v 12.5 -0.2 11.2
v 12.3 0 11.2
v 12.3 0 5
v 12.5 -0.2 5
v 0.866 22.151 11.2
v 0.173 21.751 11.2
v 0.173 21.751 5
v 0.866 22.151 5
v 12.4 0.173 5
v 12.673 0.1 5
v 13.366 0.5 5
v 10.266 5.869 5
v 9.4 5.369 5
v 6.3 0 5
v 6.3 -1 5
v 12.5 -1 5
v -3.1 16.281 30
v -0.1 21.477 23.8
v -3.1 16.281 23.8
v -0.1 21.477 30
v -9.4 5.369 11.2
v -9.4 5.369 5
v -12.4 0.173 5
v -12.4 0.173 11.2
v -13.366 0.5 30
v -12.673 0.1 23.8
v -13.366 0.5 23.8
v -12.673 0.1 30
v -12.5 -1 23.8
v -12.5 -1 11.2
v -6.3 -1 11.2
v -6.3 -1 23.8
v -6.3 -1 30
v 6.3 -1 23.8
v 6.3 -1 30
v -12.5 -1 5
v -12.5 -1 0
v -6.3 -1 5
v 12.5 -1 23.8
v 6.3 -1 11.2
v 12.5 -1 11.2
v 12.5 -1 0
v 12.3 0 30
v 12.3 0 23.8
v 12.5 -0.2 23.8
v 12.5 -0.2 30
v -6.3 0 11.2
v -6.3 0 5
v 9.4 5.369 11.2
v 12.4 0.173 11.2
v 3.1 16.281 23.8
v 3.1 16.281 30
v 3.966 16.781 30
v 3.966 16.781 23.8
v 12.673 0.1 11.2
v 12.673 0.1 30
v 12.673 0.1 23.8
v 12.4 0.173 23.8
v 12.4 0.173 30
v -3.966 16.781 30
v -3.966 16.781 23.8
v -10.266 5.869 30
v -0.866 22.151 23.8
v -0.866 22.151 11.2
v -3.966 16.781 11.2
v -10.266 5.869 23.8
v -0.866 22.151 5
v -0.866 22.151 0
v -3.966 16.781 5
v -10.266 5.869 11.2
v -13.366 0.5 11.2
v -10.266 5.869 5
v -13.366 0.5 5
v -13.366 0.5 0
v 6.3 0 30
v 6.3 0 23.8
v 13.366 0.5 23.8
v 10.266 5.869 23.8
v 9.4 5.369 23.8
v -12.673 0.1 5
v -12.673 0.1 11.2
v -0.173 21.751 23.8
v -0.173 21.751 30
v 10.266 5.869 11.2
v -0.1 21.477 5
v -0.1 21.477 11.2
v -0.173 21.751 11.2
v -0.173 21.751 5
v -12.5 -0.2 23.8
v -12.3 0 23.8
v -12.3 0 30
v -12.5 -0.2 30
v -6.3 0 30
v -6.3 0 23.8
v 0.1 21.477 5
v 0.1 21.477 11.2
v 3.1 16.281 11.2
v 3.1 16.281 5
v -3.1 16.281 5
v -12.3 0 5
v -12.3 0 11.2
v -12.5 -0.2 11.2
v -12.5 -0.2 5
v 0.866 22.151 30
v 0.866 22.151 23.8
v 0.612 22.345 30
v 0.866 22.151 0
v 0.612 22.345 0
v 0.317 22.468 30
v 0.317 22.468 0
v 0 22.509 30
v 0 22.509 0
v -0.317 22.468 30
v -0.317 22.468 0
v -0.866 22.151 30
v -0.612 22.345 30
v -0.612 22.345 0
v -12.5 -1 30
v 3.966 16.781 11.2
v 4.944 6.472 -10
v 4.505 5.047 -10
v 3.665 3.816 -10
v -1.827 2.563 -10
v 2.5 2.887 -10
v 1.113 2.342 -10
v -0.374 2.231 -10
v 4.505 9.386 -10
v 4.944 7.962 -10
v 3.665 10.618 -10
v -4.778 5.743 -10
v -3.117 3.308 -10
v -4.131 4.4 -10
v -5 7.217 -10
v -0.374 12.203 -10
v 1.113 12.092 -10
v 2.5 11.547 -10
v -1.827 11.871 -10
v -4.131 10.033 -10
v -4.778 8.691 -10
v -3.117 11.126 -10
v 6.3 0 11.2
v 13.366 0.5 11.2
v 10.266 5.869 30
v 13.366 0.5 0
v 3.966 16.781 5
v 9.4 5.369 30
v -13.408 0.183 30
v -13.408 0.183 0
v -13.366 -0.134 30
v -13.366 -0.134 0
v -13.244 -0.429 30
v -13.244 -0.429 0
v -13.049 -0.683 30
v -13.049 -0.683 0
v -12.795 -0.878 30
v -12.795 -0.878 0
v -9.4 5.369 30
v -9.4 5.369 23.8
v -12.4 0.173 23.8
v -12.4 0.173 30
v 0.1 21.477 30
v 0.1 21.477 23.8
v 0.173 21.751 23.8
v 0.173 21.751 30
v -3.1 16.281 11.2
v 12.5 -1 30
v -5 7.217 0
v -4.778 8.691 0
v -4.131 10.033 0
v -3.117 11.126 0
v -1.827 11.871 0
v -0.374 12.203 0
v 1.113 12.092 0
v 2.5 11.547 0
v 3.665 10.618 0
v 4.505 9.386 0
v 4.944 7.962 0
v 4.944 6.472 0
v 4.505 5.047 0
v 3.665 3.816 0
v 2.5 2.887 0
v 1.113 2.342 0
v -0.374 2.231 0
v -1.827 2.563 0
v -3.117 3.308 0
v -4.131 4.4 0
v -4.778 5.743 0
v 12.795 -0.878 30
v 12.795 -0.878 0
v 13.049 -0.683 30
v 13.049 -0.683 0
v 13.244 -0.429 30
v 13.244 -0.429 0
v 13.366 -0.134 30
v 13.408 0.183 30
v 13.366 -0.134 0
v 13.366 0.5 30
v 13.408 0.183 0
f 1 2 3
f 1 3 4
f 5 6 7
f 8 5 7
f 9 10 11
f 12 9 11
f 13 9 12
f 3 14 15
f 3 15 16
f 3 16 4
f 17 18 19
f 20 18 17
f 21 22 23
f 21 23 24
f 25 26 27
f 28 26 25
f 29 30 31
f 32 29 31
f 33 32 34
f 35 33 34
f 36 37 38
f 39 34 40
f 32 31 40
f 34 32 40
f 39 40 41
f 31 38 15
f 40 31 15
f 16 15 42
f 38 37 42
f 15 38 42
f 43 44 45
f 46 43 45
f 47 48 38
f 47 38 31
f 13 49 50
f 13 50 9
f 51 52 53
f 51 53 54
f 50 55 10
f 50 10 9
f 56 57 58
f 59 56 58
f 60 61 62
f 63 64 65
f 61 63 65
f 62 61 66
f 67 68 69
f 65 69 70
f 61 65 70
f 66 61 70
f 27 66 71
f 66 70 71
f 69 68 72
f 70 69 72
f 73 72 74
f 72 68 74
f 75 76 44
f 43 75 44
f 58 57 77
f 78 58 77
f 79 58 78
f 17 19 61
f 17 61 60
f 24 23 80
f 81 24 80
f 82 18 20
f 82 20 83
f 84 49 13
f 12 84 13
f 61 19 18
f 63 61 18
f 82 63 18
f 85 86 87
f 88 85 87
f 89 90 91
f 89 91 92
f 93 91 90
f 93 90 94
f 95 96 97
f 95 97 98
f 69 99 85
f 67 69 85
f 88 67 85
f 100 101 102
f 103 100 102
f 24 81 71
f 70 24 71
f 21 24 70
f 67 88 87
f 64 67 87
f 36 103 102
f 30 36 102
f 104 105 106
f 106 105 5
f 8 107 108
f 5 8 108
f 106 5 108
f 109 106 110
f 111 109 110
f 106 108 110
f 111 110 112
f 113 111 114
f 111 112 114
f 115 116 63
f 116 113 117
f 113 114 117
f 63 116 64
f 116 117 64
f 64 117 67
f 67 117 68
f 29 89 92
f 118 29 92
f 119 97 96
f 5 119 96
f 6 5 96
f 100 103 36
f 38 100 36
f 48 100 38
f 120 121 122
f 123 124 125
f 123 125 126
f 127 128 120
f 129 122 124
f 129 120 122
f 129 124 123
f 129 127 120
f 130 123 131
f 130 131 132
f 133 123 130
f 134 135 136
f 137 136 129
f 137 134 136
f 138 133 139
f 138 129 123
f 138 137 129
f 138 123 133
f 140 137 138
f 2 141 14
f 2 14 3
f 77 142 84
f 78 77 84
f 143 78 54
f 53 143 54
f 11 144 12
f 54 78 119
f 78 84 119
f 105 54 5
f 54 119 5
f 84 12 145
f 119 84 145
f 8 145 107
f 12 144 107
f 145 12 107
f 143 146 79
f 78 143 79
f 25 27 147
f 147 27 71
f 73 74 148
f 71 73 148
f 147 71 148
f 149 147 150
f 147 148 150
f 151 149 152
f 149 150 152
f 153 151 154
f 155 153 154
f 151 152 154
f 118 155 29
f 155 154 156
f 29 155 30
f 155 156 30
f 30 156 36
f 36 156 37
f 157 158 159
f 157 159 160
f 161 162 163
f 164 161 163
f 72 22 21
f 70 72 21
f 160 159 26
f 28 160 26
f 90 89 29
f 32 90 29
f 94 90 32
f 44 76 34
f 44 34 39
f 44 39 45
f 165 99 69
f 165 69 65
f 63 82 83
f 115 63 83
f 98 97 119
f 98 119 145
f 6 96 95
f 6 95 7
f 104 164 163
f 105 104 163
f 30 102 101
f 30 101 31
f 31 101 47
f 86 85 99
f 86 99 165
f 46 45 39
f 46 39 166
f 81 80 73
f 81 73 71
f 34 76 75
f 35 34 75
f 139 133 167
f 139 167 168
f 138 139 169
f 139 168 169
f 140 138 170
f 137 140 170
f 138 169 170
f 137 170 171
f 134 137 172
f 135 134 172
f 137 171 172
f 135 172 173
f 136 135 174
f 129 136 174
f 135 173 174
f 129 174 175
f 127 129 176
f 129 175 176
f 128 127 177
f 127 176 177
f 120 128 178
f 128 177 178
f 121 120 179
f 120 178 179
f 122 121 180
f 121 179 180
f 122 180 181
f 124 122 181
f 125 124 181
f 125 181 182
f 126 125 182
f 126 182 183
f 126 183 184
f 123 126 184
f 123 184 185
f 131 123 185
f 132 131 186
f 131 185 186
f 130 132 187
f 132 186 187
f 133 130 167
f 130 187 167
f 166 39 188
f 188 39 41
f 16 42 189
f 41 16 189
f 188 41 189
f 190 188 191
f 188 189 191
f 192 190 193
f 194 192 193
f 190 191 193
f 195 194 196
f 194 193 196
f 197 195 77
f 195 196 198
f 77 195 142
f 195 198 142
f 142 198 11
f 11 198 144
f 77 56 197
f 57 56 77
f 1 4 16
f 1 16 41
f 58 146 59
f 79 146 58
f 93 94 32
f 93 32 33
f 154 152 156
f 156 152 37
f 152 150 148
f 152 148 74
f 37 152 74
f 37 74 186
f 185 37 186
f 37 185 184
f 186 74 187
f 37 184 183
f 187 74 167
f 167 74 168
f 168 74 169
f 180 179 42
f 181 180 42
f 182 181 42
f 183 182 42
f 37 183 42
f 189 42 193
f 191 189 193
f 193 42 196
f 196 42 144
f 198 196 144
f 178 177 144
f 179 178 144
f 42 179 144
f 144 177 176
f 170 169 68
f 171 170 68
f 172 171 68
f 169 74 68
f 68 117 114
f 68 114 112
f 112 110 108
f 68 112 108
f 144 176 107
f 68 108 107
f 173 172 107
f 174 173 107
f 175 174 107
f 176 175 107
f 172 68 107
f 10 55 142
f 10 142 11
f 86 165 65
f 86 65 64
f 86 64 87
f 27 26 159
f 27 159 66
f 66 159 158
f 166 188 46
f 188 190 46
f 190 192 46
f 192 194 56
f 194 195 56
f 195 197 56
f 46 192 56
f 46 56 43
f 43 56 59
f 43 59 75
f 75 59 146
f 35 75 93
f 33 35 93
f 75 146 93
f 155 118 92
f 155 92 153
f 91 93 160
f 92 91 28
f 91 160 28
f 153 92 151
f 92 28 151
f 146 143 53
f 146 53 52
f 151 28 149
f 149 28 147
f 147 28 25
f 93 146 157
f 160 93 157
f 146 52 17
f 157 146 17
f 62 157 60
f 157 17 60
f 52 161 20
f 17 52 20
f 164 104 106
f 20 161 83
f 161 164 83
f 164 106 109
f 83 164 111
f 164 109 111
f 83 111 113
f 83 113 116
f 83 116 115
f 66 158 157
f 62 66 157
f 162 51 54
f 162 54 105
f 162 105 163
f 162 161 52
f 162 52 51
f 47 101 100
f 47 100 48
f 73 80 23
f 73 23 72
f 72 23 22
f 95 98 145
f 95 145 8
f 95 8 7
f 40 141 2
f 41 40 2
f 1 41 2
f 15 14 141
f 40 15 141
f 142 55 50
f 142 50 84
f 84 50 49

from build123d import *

# Parameters (mm, degrees)
EXTRUDE_1_DEPTH       = 30
EXTRUDE_8_DEPTH       = 30
SKETCH_2_W            = 6.2
SKETCH_2_H            = 6.2
CUT_EXTRUDE_5_DEPTH   = 1
EXTRUDE_9_DEPTH       = 6.2
EXTRUDE_9_DEPTH_BACK  = 23.8
SKETCH_15_W           = 6.2
SKETCH_15_H           = 6.2
CUT_EXTRUDE_10_DEPTH  = 1
EXTRUDE_10_DEPTH      = 6.2
EXTRUDE_10_DEPTH_BACK = 23.8
EXTRUDE_11_DEPTH      = 6.2
EXTRUDE_11_DEPTH_BACK = 23.8
SKETCH_20_W           = 6.2
SKETCH_20_H           = 6.2
CUT_EXTRUDE_11_DEPTH  = 1
EXTRUDE_12_DEPTH      = 6.2
EXTRUDE_12_DEPTH_BACK = 23.8
EXTRUDE_13_DEPTH      = 6.2
EXTRUDE_13_DEPTH_BACK = 23.8
EXTRUDE_14_DEPTH      = 6.2
EXTRUDE_14_DEPTH_BACK = 23.8
SKETCH_25_R           = 5
EXTRUDE_15_DEPTH      = 10


with BuildPart() as part:
    # ｽｹｯﾁ1 → ﾎﾞｽ - 押し出し1 (new body)
    with BuildSketch(Plane.XY):
        Polygon((0, 21.650635095), (-12.5, 0), (12.5, 0), align=None)
    extrude(amount=EXTRUDE_1_DEPTH)

    # ｽｹｯﾁ11 → ﾎﾞｽ - 押し出し8 (add, through all)
    with BuildSketch(Plane(origin=(0, 0, 0), x_dir=(-1, 0, 0), z_dir=(0, 0, -1))):
        with BuildLine():
            Line((0.866025404, 22.150635095), (13.366025404, 0.5))
            ThreePointArc((13.366025404, 0.5), (13.243672874, -0.429359734), (12.5, -1))
            Line((12.5, -1), (-12.5, -1))
            ThreePointArc((-12.5, -1), (-13.243672874, -0.429359734), (-13.366025404, 0.5))
            Line((-13.366025404, 0.5), (-0.866025404, 22.150635095))
            ThreePointArc((-0.866025404, 22.150635095), (0, 22.509354562), (0.866025404, 22.150635095))
        make_face()
        Polygon((0, 21.650635095), (12.5, 0), (-12.5, 0), align=None, mode=Mode.SUBTRACT)
    extrude(amount=-EXTRUDE_8_DEPTH)

    # ｽｹｯﾁ2 → ｶｯﾄ - 押し出し5 (cut)
    with BuildSketch(Plane(origin=(-9.375, 5.412658774, 0), x_dir=(0, 0, 1), z_dir=(-0.866025404, 0.5, 0))):
        with Locations((26.9, -3.15)):
            Rectangle(SKETCH_2_W, SKETCH_2_H)
        with Locations((26.9, 15.65)):
            Rectangle(SKETCH_2_W, SKETCH_2_H)
        with Locations((8.1, -3.15)):
            Rectangle(SKETCH_2_W, SKETCH_2_H)
        with Locations((8.1, 15.65)):
            Rectangle(SKETCH_2_W, SKETCH_2_H)
    extrude(amount=CUT_EXTRUDE_5_DEPTH, mode=Mode.SUBTRACT)

    # ｽｹｯﾁ16 → ﾎﾞｽ - 押し出し9 (add, two sides)
    with BuildSketch(Plane.XY.offset(23.8)) as extrude_9_sk:
        Polygon((-12.4, 0.173205081), (-12.673205081, 0.1), (-12.5, 0), align=None)
    extrude(amount=EXTRUDE_9_DEPTH)
    extrude(extrude_9_sk.sketch, amount=-EXTRUDE_9_DEPTH_BACK)

    # ｽｹｯﾁ15 → ｶｯﾄ - 押し出し10 (cut)
    with BuildSketch(Plane.XZ):
        with Locations((-9.4, 26.9)):
            Rectangle(SKETCH_15_W, SKETCH_15_H)
        with Locations((9.4, 26.9)):
            Rectangle(SKETCH_15_W, SKETCH_15_H)
        with Locations((9.4, 8.1)):
            Rectangle(SKETCH_15_W, SKETCH_15_H)
        with Locations((-9.4, 8.1)):
            Rectangle(SKETCH_15_W, SKETCH_15_H)
    extrude(amount=CUT_EXTRUDE_10_DEPTH, mode=Mode.SUBTRACT)

    # ｽｹｯﾁ18 → ﾎﾞｽ - 押し出し10 (add, two sides)
    with BuildSketch(Plane.XY.offset(23.8)) as extrude_10_sk:
        Polygon((-0.173205081, 21.750635095), (0, 21.650635095), (-0.1, 21.477430014), align=None)
    extrude(amount=EXTRUDE_10_DEPTH)
    extrude(extrude_10_sk.sketch, amount=-EXTRUDE_10_DEPTH_BACK)

    # ｽｹｯﾁ19 → ﾎﾞｽ - 押し出し11 (add, two sides)
    with BuildSketch(Plane.XY.offset(23.8)) as extrude_11_sk:
        Polygon((12.5, 0), (12.3, 0), (12.5, -0.2), align=None)
    extrude(amount=EXTRUDE_11_DEPTH)
    extrude(extrude_11_sk.sketch, amount=-EXTRUDE_11_DEPTH_BACK)

    # ｽｹｯﾁ20 → ｶｯﾄ - 押し出し11 (cut)
    with BuildSketch(Plane(origin=(9.375, 5.412658774, 0), x_dir=(0, 0, -1), z_dir=(0.866025404, 0.5, 0))):
        with Locations((-26.9, -3.15)):
            Rectangle(SKETCH_20_W, SKETCH_20_H)
        with Locations((-26.9, 15.65)):
            Rectangle(SKETCH_20_W, SKETCH_20_H)
        with Locations((-8.1, -3.15)):
            Rectangle(SKETCH_20_W, SKETCH_20_H)
        with Locations((-8.1, 15.65)):
            Rectangle(SKETCH_20_W, SKETCH_20_H)
    extrude(amount=CUT_EXTRUDE_11_DEPTH, mode=Mode.SUBTRACT)

    # ｽｹｯﾁ21 → ﾎﾞｽ - 押し出し12 (add, two sides)
    with BuildSketch(Plane.XY.offset(23.8)) as extrude_12_sk:
        Polygon((0, 21.650635095), (0.1, 21.477430014), (0.173205081, 21.750635095), align=None)
    extrude(amount=EXTRUDE_12_DEPTH)
    extrude(extrude_12_sk.sketch, amount=-EXTRUDE_12_DEPTH_BACK)

    # ｽｹｯﾁ23 → ﾎﾞｽ - 押し出し13 (add, two sides)
    with BuildSketch(Plane.XY.offset(23.8)) as extrude_13_sk:
        Polygon((12.5, 0), (12.673205081, 0.1), (12.4, 0.173205081), align=None)
    extrude(amount=EXTRUDE_13_DEPTH)
    extrude(extrude_13_sk.sketch, amount=-EXTRUDE_13_DEPTH_BACK)

    # ｽｹｯﾁ24 → ﾎﾞｽ - 押し出し14 (add, two sides)
    with BuildSketch(Plane.XY.offset(23.8)) as extrude_14_sk:
        Polygon((-12.5, 0), (-12.3, 0), (-12.5, -0.2), align=None)
    extrude(amount=EXTRUDE_14_DEPTH)
    extrude(extrude_14_sk.sketch, amount=-EXTRUDE_14_DEPTH_BACK)

    # ｽｹｯﾁ25 → ﾎﾞｽ - 押し出し15 (add)
    with BuildSketch(Plane(origin=(0, 0, 0), x_dir=(-1, 0, 0), z_dir=(0, 0, -1))):
        with Locations((0, 7.216878365)):
            Circle(SKETCH_25_R)
    extrude(amount=EXTRUDE_15_DEPTH)


solid = part.part
